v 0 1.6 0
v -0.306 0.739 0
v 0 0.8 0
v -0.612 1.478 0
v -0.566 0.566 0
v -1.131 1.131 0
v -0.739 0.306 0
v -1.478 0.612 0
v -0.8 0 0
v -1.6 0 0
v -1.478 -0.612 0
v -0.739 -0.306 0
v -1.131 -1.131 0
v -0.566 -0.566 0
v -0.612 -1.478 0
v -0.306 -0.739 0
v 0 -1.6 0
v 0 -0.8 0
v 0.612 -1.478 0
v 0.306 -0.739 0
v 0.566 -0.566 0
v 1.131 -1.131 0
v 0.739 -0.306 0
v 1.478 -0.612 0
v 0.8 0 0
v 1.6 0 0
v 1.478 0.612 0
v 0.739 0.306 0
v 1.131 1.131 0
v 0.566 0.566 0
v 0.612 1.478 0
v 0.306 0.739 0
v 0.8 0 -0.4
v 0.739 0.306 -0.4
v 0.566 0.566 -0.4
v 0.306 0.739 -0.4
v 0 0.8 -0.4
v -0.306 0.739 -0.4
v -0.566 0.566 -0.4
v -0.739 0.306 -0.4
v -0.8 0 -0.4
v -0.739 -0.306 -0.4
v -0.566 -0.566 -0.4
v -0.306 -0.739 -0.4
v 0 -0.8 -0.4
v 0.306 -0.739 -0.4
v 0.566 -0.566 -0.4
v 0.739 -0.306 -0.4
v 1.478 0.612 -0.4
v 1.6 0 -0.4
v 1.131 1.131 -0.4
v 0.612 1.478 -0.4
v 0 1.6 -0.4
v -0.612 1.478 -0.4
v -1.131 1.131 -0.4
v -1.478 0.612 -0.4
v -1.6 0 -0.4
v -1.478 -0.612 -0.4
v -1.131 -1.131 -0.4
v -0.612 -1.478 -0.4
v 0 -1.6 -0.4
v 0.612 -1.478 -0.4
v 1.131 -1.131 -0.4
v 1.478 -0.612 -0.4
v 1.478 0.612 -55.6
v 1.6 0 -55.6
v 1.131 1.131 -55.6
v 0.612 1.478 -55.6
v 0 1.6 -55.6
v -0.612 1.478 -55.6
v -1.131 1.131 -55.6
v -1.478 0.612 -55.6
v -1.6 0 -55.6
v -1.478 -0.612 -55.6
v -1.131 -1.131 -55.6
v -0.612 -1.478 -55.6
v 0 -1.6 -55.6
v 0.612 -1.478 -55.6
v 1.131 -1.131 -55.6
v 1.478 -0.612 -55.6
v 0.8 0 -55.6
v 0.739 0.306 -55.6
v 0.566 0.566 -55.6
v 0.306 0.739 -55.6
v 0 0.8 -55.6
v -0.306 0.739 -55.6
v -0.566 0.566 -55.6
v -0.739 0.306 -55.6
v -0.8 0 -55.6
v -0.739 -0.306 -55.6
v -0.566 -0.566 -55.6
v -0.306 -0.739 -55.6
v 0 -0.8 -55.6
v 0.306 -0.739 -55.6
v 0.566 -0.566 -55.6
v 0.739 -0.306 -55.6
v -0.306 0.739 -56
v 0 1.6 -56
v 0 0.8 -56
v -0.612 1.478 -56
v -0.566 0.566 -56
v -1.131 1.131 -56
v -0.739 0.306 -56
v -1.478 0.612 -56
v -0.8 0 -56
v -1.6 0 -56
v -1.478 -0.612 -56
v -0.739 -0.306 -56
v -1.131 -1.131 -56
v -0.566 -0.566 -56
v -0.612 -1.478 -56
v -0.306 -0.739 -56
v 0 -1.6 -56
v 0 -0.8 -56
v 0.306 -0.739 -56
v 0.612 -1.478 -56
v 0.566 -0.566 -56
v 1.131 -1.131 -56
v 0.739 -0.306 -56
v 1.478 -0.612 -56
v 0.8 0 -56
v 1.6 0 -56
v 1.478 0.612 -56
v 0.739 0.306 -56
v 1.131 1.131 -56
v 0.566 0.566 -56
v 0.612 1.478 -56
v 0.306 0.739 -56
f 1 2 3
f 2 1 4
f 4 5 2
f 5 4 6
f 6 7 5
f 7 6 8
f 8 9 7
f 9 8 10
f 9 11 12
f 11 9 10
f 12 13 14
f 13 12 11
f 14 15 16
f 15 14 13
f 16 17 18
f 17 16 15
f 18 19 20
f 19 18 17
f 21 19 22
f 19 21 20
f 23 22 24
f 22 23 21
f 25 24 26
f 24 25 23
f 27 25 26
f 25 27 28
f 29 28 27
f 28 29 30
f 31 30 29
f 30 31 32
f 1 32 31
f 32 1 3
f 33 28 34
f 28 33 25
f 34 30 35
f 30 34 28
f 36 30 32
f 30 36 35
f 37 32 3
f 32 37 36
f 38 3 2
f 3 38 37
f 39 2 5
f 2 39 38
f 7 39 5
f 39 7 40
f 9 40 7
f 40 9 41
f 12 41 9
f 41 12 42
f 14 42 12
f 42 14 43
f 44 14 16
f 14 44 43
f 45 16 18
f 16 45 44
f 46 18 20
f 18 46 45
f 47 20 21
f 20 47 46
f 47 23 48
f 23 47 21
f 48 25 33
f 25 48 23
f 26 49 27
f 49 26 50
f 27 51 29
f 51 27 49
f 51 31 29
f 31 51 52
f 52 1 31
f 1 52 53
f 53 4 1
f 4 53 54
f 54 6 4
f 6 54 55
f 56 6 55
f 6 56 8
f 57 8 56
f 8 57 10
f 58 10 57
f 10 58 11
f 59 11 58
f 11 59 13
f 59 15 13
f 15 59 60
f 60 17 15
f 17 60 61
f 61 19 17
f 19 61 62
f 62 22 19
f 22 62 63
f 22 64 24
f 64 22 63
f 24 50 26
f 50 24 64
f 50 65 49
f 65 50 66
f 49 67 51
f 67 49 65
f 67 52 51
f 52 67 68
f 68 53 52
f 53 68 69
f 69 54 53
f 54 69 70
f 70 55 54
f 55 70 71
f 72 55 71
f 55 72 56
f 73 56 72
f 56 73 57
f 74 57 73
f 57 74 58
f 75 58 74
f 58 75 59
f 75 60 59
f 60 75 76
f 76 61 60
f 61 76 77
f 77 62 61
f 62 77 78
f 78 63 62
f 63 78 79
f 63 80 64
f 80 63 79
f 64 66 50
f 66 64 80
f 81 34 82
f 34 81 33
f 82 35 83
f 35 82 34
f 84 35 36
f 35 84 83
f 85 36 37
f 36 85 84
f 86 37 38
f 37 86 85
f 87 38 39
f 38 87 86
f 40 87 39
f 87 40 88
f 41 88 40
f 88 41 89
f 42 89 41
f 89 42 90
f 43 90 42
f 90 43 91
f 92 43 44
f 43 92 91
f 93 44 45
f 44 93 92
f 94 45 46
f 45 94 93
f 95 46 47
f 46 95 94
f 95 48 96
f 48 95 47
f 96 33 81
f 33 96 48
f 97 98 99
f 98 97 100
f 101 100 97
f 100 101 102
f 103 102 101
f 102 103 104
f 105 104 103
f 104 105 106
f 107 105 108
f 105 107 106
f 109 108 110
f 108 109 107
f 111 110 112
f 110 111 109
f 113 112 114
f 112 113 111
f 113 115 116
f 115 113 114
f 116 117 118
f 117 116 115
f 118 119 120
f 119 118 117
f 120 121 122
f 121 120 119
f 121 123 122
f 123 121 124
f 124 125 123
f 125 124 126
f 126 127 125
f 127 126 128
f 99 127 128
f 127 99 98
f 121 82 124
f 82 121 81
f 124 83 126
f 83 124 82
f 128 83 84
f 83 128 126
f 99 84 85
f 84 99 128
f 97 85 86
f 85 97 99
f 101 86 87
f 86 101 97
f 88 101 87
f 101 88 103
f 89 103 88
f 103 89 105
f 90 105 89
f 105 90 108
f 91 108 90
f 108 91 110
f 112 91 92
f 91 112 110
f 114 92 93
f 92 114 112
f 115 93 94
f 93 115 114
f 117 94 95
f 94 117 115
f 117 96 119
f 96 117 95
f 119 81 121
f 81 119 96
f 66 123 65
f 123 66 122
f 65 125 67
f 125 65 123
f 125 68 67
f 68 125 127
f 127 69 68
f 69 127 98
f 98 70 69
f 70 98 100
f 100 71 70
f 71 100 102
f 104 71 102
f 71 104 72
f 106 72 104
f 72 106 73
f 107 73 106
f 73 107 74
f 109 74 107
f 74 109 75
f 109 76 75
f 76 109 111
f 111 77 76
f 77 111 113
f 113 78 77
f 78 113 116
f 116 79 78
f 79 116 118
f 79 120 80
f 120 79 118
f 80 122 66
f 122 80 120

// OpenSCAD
// file: ../p/4-4disc.scad
use <../lib.scad>
$fa=1; $fs=0.2;
function ldraw_lib__4_4disc(realsolid=false) = [
// 0 Disc 1.0
// 0 Name: 4-4disc.dat
// 0 Author: James Jessiman
// 0 !LDRAW_ORG Primitive UPDATE 2002-02
// 0 !LICENSE Licensed under CC BY 2.0 and CC BY 4.0 : see CAreadme.txt
// 
// 0 BFC CERTIFY CCW
  [0,"BFC","CERTIFY"],
  [0,"BFC","CCW"],
// 
// 0 !HISTORY 1998-12-15 [PTadmin] Official Update 1998-10
// 0 !HISTORY 2002-03-23 [sbliss] Added BFC statement
// 0 !HISTORY 2002-04-25 [PTadmin] Official Update 2002-02
// 0 !HISTORY 2007-06-24 [PTadmin] Header formatted for Contributor Agreement
// 0 !HISTORY 2008-07-01 [PTadmin] Official Update 2008-01
// 
// 
// 3 16 0 0 0 1 0 0 0.9239 0 0.3827
  [3,16,0,0,0,1,0,0,0.9239,0,0.3827],
// 3 16 0 0 0 0.9239 0 0.3827 0.7071 0 0.7071
  [3,16,0,0,0,0.9239,0,0.3827,0.7071,0,0.7071],
// 3 16 0 0 0 0.7071 0 0.7071 0.3827 0 0.9239
  [3,16,0,0,0,0.7071,0,0.7071,0.3827,0,0.9239],
// 3 16 0 0 0 0.3827 0 0.9239 0 0 1
  [3,16,0,0,0,0.3827,0,0.9239,0,0,1],
// 3 16 0 0 0 0 0 1 -0.3827 0 0.9239
  [3,16,0,0,0,0,0,1,-0.3827,0,0.9239],
// 3 16 0 0 0 -0.3827 0 0.9239 -0.7071 0 0.7071
  [3,16,0,0,0,-0.3827,0,0.9239,-0.7071,0,0.7071],
// 3 16 0 0 0 -0.7071 0 0.7071 -0.9239 0 0.3827
  [3,16,0,0,0,-0.7071,0,0.7071,-0.9239,0,0.3827],
// 3 16 0 0 0 -0.9239 0 0.3827 -1 0 -0
  [3,16,0,0,0,-0.9239,0,0.3827,-1,0,-0],
// 3 16 0 0 0 -1 0 -0 -0.9239 0 -0.3827
  [3,16,0,0,0,-1,0,-0,-0.9239,0,-0.3827],
// 3 16 0 0 0 -0.9239 0 -0.3827 -0.7071 0 -0.7071
  [3,16,0,0,0,-0.9239,0,-0.3827,-0.7071,0,-0.7071],
// 3 16 0 0 0 -0.7071 0 -0.7071 -0.3827 0 -0.9239
  [3,16,0,0,0,-0.7071,0,-0.7071,-0.3827,0,-0.9239],
// 3 16 0 0 0 -0.3827 0 -0.9239 0 0 -1
  [3,16,0,0,0,-0.3827,0,-0.9239,0,0,-1],
// 3 16 0 0 0 0 0 -1 0.3827 0 -0.9239
  [3,16,0,0,0,0,0,-1,0.3827,0,-0.9239],
// 3 16 0 0 0 0.3827 0 -0.9239 0.7071 0 -0.7071
  [3,16,0,0,0,0.3827,0,-0.9239,0.7071,0,-0.7071],
// 3 16 0 0 0 0.7071 0 -0.7071 0.9239 0 -0.3827
  [3,16,0,0,0,0.7071,0,-0.7071,0.9239,0,-0.3827],
// 3 16 0 0 0 0.9239 0 -0.3827 1 0 0
  [3,16,0,0,0,0.9239,0,-0.3827,1,0,0],
// 0
];
module ldraw_lib__4_4disc(step=0, col=false, unit=2/5, alt=false, line=0.2, solid=!$preview)
    makepoly(ldraw_lib__4_4disc(solid), step=step, col=col, unit=unit, alt=alt, line=line, solid=solid);
ldraw_lib__4_4disc(line=0.2);
// file: ../p/stud3.scad
use <../lib.scad>
use <4-4cyli.scad>
use <4-4disc.scad>
use <4-4edge.scad>
$fa=1; $fs=0.2;
function ldraw_lib__stud3(realsolid=false) = realsolid ? 
    [openscad(translate([0,0,-eps()], o=cylinder(4+eps(), r=4)),2)] : [
// 0 Stud Tube Solid
// 0 Name: stud3.dat
// 0 Author: James Jessiman
// 0 !LDRAW_ORG Primitive UPDATE 2012-01
// 0 !LICENSE Licensed under CC BY 2.0 and CC BY 4.0 : see CAreadme.txt
// 
// 0 BFC CERTIFY CCW
  [0,"BFC","CERTIFY"],
  [0,"BFC","CCW"],
// 
// 0 !HISTORY 2002-04-04 [sbliss] Modified for BFC compliance
// 0 !HISTORY 2002-04-25 [PTadmin] Official Update 2002-02
// 0 !HISTORY 2007-06-24 [PTadmin] Header formatted for Contributor Agreement
// 0 !HISTORY 2008-07-01 [PTadmin] Official Update 2008-01
// 0 !HISTORY 2012-02-16 [Philo] Changed to CCW
// 0 !HISTORY 2012-03-30 [PTadmin] Official Update 2012-01
// 
// 
// 1 16 0 -4 0 4 0 0 0 1 0 0 0 4 4-4edge.dat
  [1,16,0,-4,0,4,0,0,0,1,0,0,0,4, ldraw_lib__4_4edge(realsolid)],
// 1 16 0 0 0 4 0 0 0 1 0 0 0 4 4-4edge.dat
  [1,16,0,0,0,4,0,0,0,1,0,0,0,4, ldraw_lib__4_4edge(realsolid)],
// 1 16 0 -4 0 4 0 0 0 1 0 0 0 4 4-4disc.dat
  [1,16,0,-4,0,4,0,0,0,1,0,0,0,4, ldraw_lib__4_4disc(realsolid)],
// 1 16 0 -4 0 4 0 0 0 4 0 0 0 4 4-4cyli.dat
  [1,16,0,-4,0,4,0,0,0,4,0,0,0,4, ldraw_lib__4_4cyli(realsolid)],
];
module ldraw_lib__stud3(step=0, col=false, unit=2/5, alt=false, line=0.2, solid=!$preview)
    makepoly(ldraw_lib__stud3(solid), step=step, col=col, unit=unit, alt=alt, line=line, solid=solid);
ldraw_lib__stud3(line=0.2);
// file: ../p/stud.scad
use <../lib.scad>
use <4-4cyli.scad>
use <4-4disc.scad>
use <4-4edge.scad>
$fa=1; $fs=0.2;
function ldraw_lib__stud(realsolid=false) = realsolid ? 
    [openscad(translate([0,0,-eps()], o=cylinder(4+eps(), r=6)),2)] : [
// 0 Stud
// 0 Name: stud.dat
// 0 Author: James Jessiman
// 0 !LDRAW_ORG Primitive UPDATE 2012-01
// 0 !LICENSE Licensed under CC BY 2.0 and CC BY 4.0 : see CAreadme.txt
// 
// 0 BFC CERTIFY CCW
  [0,"BFC","CERTIFY"],
  [0,"BFC","CCW"],
// 
// 0 !HISTORY 2002-04-04 [sbliss] Modified for BFC compliance
// 0 !HISTORY 2002-04-25 [PTadmin] Official Update 2002-02
// 0 !HISTORY 2007-06-24 [PTadmin] Header formatted for Contributor Agreement
// 0 !HISTORY 2008-07-01 [PTadmin] Official Update 2008-01
// 0 !HISTORY 2012-02-16 [Philo] Changed to CCW
// 0 !HISTORY 2012-03-30 [PTadmin] Official Update 2012-01
// 
// 
// 1 16 0 0 0 6 0 0 0 1 0 0 0 6 4-4edge.dat
  [1,16,0,0,0,6,0,0,0,1,0,0,0,6, ldraw_lib__4_4edge(realsolid)],
// 1 16 0 -4 0 6 0 0 0 1 0 0 0 6 4-4edge.dat
  [1,16,0,-4,0,6,0,0,0,1,0,0,0,6, ldraw_lib__4_4edge(realsolid)],
// 1 16 0 0 0 6 0 0 0 -4 0 0 0 6 4-4cyli.dat
  [1,16,0,0,0,6,0,0,0,-4,0,0,0,6, ldraw_lib__4_4cyli(realsolid)],
// 1 16 0 -4 0 6 0 0 0 1 0 0 0 6 4-4disc.dat
  [1,16,0,-4,0,6,0,0,0,1,0,0,0,6, ldraw_lib__4_4disc(realsolid)],
];
module ldraw_lib__stud(step=0, col=false, unit=2/5, alt=false, line=0.2, solid=!$preview)
    makepoly(ldraw_lib__stud(solid), step=step, col=col, unit=unit, alt=alt, line=line, solid=solid);
ldraw_lib__stud(line=0.2);
// file: ../p/box5.scad
use <../lib.scad>
$fa=1; $fs=0.2;
function ldraw_lib__box5(realsolid=false) = [
// 0 Box with 5 Faces and All Edges
// 0 Name: box5.dat
// 0 Author: James Jessiman
// 0 !LDRAW_ORG Primitive UPDATE 2012-01
// 0 !LICENSE Licensed under CC BY 2.0 and CC BY 4.0 : see CAreadme.txt
// 
// 0 BFC CERTIFY CCW
  [0,"BFC","CERTIFY"],
  [0,"BFC","CCW"],
// 
// 0 !HISTORY 2002-04-03 [sbliss] Modified for BFC compliance
// 0 !HISTORY 2002-04-25 [PTadmin] Official Update 2002-02
// 0 !HISTORY 2007-06-24 [PTadmin] Header formatted for Contributor Agreement
// 0 !HISTORY 2008-07-01 [PTadmin] Official Update 2008-01
// 0 !HISTORY 2012-02-16 [Philo] Changed to CCW
// 0 !HISTORY 2012-03-30 [PTadmin] Official Update 2012-01
// 
// 
// 2 24 1 1 1 -1 1 1
  [2,24,1,1,1,-1,1,1],
// 2 24 -1 1 1 -1 1 -1
  [2,24,-1,1,1,-1,1,-1],
// 2 24 -1 1 -1 1 1 -1
  [2,24,-1,1,-1,1,1,-1],
// 2 24 1 1 -1 1 1 1
  [2,24,1,1,-1,1,1,1],
// 2 24 1 0 1 -1 0 1
  [2,24,1,0,1,-1,0,1],
// 2 24 -1 0 1 -1 0 -1
  [2,24,-1,0,1,-1,0,-1],
// 2 24 -1 0 -1 1 0 -1
  [2,24,-1,0,-1,1,0,-1],
// 2 24 1 0 -1 1 0 1
  [2,24,1,0,-1,1,0,1],
// 2 24 1 0 1 1 1 1
  [2,24,1,0,1,1,1,1],
// 2 24 -1 0 1 -1 1 1
  [2,24,-1,0,1,-1,1,1],
// 2 24 1 0 -1 1 1 -1
  [2,24,1,0,-1,1,1,-1],
// 2 24 -1 0 -1 -1 1 -1
  [2,24,-1,0,-1,-1,1,-1],
// 4 16 -1 1 1 1 1 1 1 1 -1 -1 1 -1
  [4,16,-1,1,1,1,1,1,1,1,-1,-1,1,-1],
// 4 16 -1 1 1 -1 0 1 1 0 1 1 1 1
  [4,16,-1,1,1,-1,0,1,1,0,1,1,1,1],
// 4 16 -1 1 -1 -1 0 -1 -1 0 1 -1 1 1
  [4,16,-1,1,-1,-1,0,-1,-1,0,1,-1,1,1],
// 4 16 1 1 -1 1 0 -1 -1 0 -1 -1 1 -1
  [4,16,1,1,-1,1,0,-1,-1,0,-1,-1,1,-1],
// 4 16 1 1 1 1 0 1 1 0 -1 1 1 -1
  [4,16,1,1,1,1,0,1,1,0,-1,1,1,-1],
];
module ldraw_lib__box5(step=0, col=false, unit=2/5, alt=false, line=0.2, solid=!$preview)
    makepoly(ldraw_lib__box5(solid), step=step, col=col, unit=unit, alt=alt, line=line, solid=solid);
ldraw_lib__box5(line=0.2);
// file: ../p/box4t.scad
use <../lib.scad>
$fa=1; $fs=0.2;
function ldraw_lib__box4t(realsolid=false) = [
// 0 Box with 4 Adjacent Faces and All Edges
// 0 Name: box4t.dat
// 0 Author: Tore Eriksson [Tore_Eriksson]
// 0 !LDRAW_ORG Primitive UPDATE 2003-02
// 0 !LICENSE Licensed under CC BY 2.0 and CC BY 4.0 : see CAreadme.txt
// 
// 0 BFC CERTIFY CCW
  [0,"BFC","CERTIFY"],
  [0,"BFC","CCW"],
// 
// 0 !HISTORY 1997-09-29 [PTadmin] Official Update 1997-15
// 0 !HISTORY 2002-08-31 [izanette] Modified with WINDZ for BFC compliance
// 0 !HISTORY 2003-08-01 [PTadmin] Official Update 2003-02
// 0 !HISTORY 2007-06-24 [PTadmin] Header formatted for Contributor Agreement
// 0 !HISTORY 2008-07-01 [PTadmin] Official Update 2008-01
// 
// 
// 2 24 1 1 1 -1 1 1
  [2,24,1,1,1,-1,1,1],
// 2 24 -1 1 1 -1 1 -1
  [2,24,-1,1,1,-1,1,-1],
// 2 24 -1 1 -1 1 1 -1
  [2,24,-1,1,-1,1,1,-1],
// 2 24 1 1 -1 1 1 1
  [2,24,1,1,-1,1,1,1],
// 2 24 1 0 1 -1 0 1
  [2,24,1,0,1,-1,0,1],
// 2 24 -1 0 1 -1 0 -1
  [2,24,-1,0,1,-1,0,-1],
// 2 24 -1 0 -1 1 0 -1
  [2,24,-1,0,-1,1,0,-1],
// 2 24 1 0 -1 1 0 1
  [2,24,1,0,-1,1,0,1],
// 2 24 1 0 1 1 1 1
  [2,24,1,0,1,1,1,1],
// 2 24 -1 0 1 -1 1 1
  [2,24,-1,0,1,-1,1,1],
// 2 24 1 0 -1 1 1 -1
  [2,24,1,0,-1,1,1,-1],
// 2 24 -1 0 -1 -1 1 -1
  [2,24,-1,0,-1,-1,1,-1],
// 4 16 1 1 1 1 1 -1 -1 1 -1 -1 1 1
  [4,16,1,1,1,1,1,-1,-1,1,-1,-1,1,1],
// 4 16 1 1 1 -1 1 1 -1 0 1 1 0 1
  [4,16,1,1,1,-1,1,1,-1,0,1,1,0,1],
// 4 16 -1 1 1 -1 1 -1 -1 0 -1 -1 0 1
  [4,16,-1,1,1,-1,1,-1,-1,0,-1,-1,0,1],
// 0 4 16 -1 1 -1 -1 0 -1 1 0 -1 1 1 -1
// 4 16 1 1 -1 1 1 1 1 0 1 1 0 -1
  [4,16,1,1,-1,1,1,1,1,0,1,1,0,-1],
// 0
];
module ldraw_lib__box4t(step=0, col=false, unit=2/5, alt=false, line=0.2, solid=!$preview)
    makepoly(ldraw_lib__box4t(solid), step=step, col=col, unit=unit, alt=alt, line=line, solid=solid);
ldraw_lib__box4t(line=0.2);
// file: s/3004s01.scad
use <../../lib.scad>
use <../../p/box4t.scad>
use <../../p/box5.scad>
use <../../p/stud.scad>
use <../../p/stud3.scad>
$fa=1; $fs=0.2;
function ldraw_lib__s__3004s01(realsolid=false) = [
// 0 ~Brick  1 x  2 without Front Face
// 0 Name: s\3004s01.dat
// 0 Author: James Jessiman
// 0 !LDRAW_ORG Subpart UPDATE 2003-03
// 0 !LICENSE Licensed under CC BY 2.0 and CC BY 4.0 : see CAreadme.txt
// 
// 0 BFC CERTIFY CCW
  [0,"BFC","CERTIFY"],
  [0,"BFC","CCW"],
// 
// 0 !HISTORY 2003-09-07 [jriley] Subfiling, BFC
// 0 !HISTORY 2003-12-19 [PTadmin] Official Update 2003-03
// 0 !HISTORY 2007-08-29 [PTadmin] Header formatted for Contributor Agreement
// 0 !HISTORY 2008-07-01 [PTadmin] Official Update 2008-01
// 
// 
// 1 16 0 4 0 1 0 0 0 -5 0 0 0 1 stud3.dat
  [1,16,0,4,0,1,0,0,0,-5,0,0,0,1, ldraw_lib__stud3(realsolid)],
// 0 BFC INVERTNEXT
  [0,"BFC","INVERTNEXT"],
// 1 16 0 24 0 16 0 0 0 -20 0 0 0 6 box5.dat
  [1,16,0,24,0,16,0,0,0,-20,0,0,0,6, ldraw_lib__box5(realsolid)],
// 4 16 20 24 10 16 24 6 -16 24 6 -20 24 10
  [4,16,20,24,10,16,24,6,-16,24,6,-20,24,10],
// 4 16 -20 24 10 -16 24 6 -16 24 -6 -20 24 -10
  [4,16,-20,24,10,-16,24,6,-16,24,-6,-20,24,-10],
// 4 16 -20 24 -10 -16 24 -6 16 24 -6 20 24 -10
  [4,16,-20,24,-10,-16,24,-6,16,24,-6,20,24,-10],
// 4 16 20 24 -10 16 24 -6 16 24 6 20 24 10
  [4,16,20,24,-10,16,24,-6,16,24,6,20,24,10],
// 1 16 0 24 0 20 0 0 0 -24 0 0 0 10 box4t.dat
  [1,16,0,24,0,20,0,0,0,-24,0,0,0,10, ldraw_lib__box4t(realsolid)],
// 1 16 10 0 0 1 0 0 0 1 0 0 0 1 stud.dat
  [1,16,10,0,0,1,0,0,0,1,0,0,0,1, ldraw_lib__stud(realsolid)],
// 1 16 -10 0 0 1 0 0 0 1 0 0 0 1 stud.dat
  [1,16,-10,0,0,1,0,0,0,1,0,0,0,1, ldraw_lib__stud(realsolid)],
// 0
];
module ldraw_lib__s__3004s01(step=0, col=false, unit=2/5, alt=false, line=0.2, solid=!$preview)
    makepoly(ldraw_lib__s__3004s01(solid), step=step, col=col, unit=unit, alt=alt, line=line, solid=solid);
ldraw_lib__s__3004s01(line=0.2);
// file: ../p/4-4ring1.scad
use <../lib.scad>
$fa=1; $fs=0.2;
function ldraw_lib__4_4ring1(realsolid=false) = [
// 0 Ring  1 x 1.0
// 0 Name: 4-4ring1.dat
// 0 Author: James Jessiman
// 0 !LDRAW_ORG Primitive UPDATE 2009-01
// 0 !LICENSE Licensed under CC BY 2.0 and CC BY 4.0 : see CAreadme.txt
// 
// 0 BFC CERTIFY CCW
  [0,"BFC","CERTIFY"],
  [0,"BFC","CCW"],
// 
// 0 !HISTORY 1998-12-15 [PTadmin] Official Update 1998-10
// 0 !HISTORY 2002-04-08 [BrickCaster] Modified for BFC compliance
// 0 !HISTORY 2002-04-25 [PTadmin] Official Update 2002-02
// 0 !HISTORY 2007-06-24 [PTadmin] Header formatted for Contributor Agreement
// 0 !HISTORY 2008-07-01 [PTadmin] Official Update 2008-01
// 0 !HISTORY 2008-08-26 [cwdee] Switch polygon winding and rename
// 0 !HISTORY 2009-05-02 [PTadmin] Official Update 2009-01
// 
// 
// 4 16 -0.7654 0 1.8478 -0.3827 0 0.9239 0 0 1 0 0 2
  [4,16,-0.7654,0,1.8478,-0.3827,0,0.9239,0,0,1,0,0,2],
// 4 16 -1.4142 0 1.4142 -0.7071 0 0.7071 -0.3827 0 0.9239 -0.7654 0 1.8478
  [4,16,-1.4142,0,1.4142,-0.7071,0,0.7071,-0.3827,0,0.9239,-0.7654,0,1.8478],
// 4 16 -1.8478 0 0.7654 -0.9239 0 0.3827 -0.7071 0 0.7071 -1.4142 0 1.41420
  [4,16,-1.8478,0,0.7654,-0.9239,0,0.3827,-0.7071,0,0.7071,-1.4142,0,1.41420],
// 4 16 -2 0 0 -1 0 0 -0.9239 0 0.3827 -1.8478 0 0.7654
  [4,16,-2,0,0,-1,0,0,-0.9239,0,0.3827,-1.8478,0,0.7654],
// 4 16 -1.8478 0 -0.7654 -0.9239 0 -0.3827 -1 0 0 -2 0 0
  [4,16,-1.8478,0,-0.7654,-0.9239,0,-0.3827,-1,0,0,-2,0,0],
// 4 16 -1.4142 0 -1.4142 -0.7071 0 -0.7071 -0.9239 0 -0.3827 -1.8478 0 -0.7654
  [4,16,-1.4142,0,-1.4142,-0.7071,0,-0.7071,-0.9239,0,-0.3827,-1.8478,0,-0.7654],
// 4 16 -0.7654 0 -1.8478 -0.3827 0 -0.9239 -0.7071 0 -0.7071 -1.4142 0 -1.4142
  [4,16,-0.7654,0,-1.8478,-0.3827,0,-0.9239,-0.7071,0,-0.7071,-1.4142,0,-1.4142],
// 4 16 0 0 -2 0 0 -1 -0.3827 0 -0.9239 -0.7654 0 -1.8478
  [4,16,0,0,-2,0,0,-1,-0.3827,0,-0.9239,-0.7654,0,-1.8478],
// 4 16 0.7654 0 -1.8478 0.3827 0 -0.9239 0 0 -1 0 0 -2
  [4,16,0.7654,0,-1.8478,0.3827,0,-0.9239,0,0,-1,0,0,-2],
// 4 16 1.4142 0 -1.4142 0.7071 0 -0.7071 0.3827 0 -0.9239 0.7654 0 -1.8478
  [4,16,1.4142,0,-1.4142,0.7071,0,-0.7071,0.3827,0,-0.9239,0.7654,0,-1.8478],
// 4 16 1.8478 0 -0.7654 0.9239 0 -0.3827 0.7071 0 -0.7071 1.4142 0 -1.4142
  [4,16,1.8478,0,-0.7654,0.9239,0,-0.3827,0.7071,0,-0.7071,1.4142,0,-1.4142],
// 4 16 2 0 0 1 0 0 0.9239 0 -0.3827 1.8478 0 -0.7654
  [4,16,2,0,0,1,0,0,0.9239,0,-0.3827,1.8478,0,-0.7654],
// 4 16 1.8478 0 0.7654 0.9239 0 0.3827 1 0 0 2 0 0
  [4,16,1.8478,0,0.7654,0.9239,0,0.3827,1,0,0,2,0,0],
// 4 16 1.4142 0 1.4142 0.7071 0 0.7071 0.9239 0 0.3827 1.8478 0 0.7654
  [4,16,1.4142,0,1.4142,0.7071,0,0.7071,0.9239,0,0.3827,1.8478,0,0.7654],
// 4 16 0.7654 0 1.8478 0.3827 0 0.9239 0.7071 0 0.7071 1.4142 0 1.4142
  [4,16,0.7654,0,1.8478,0.3827,0,0.9239,0.7071,0,0.7071,1.4142,0,1.4142],
// 4 16 0 0 2 0 0 1 0.3827 0 0.9239 0.7654 0 1.8478
  [4,16,0,0,2,0,0,1,0.3827,0,0.9239,0.7654,0,1.8478],
// 0
];
module ldraw_lib__4_4ring1(step=0, col=false, unit=2/5, alt=false, line=0.2, solid=!$preview)
    makepoly(ldraw_lib__4_4ring1(solid), step=step, col=col, unit=unit, alt=alt, line=line, solid=solid);
ldraw_lib__4_4ring1(line=0.2);
// file: ../p/4-4edge.scad
use <../lib.scad>
$fa=1; $fs=0.2;
function ldraw_lib__4_4edge(realsolid=false) = [
// 0 Circle 1.0
// 0 Name: 4-4edge.dat
// 0 Author: James Jessiman
// 0 !LDRAW_ORG Primitive UPDATE 2017-01
// 0 !LICENSE Licensed under CC BY 2.0 and CC BY 4.0 : see CAreadme.txt
// 
// 0 BFC CERTIFY CCW
  [0,"BFC","CERTIFY"],
  [0,"BFC","CCW"],
// 
// 0 !HISTORY 1998-12-15 [PTadmin] Official Update 1998-10
// 0 !HISTORY 2005-12-28 [PTadmin] Official Update 2005-01
// 0 !HISTORY 2007-06-24 [PTadmin] Header formatted for Contributor Agreement
// 0 !HISTORY 2008-07-01 [PTadmin] Official Update 2008-01
// 0 !HISTORY 2017-01-15 [Steffen] BFCed
// 0 !HISTORY 2017-12-30 [PTadmin] Official Update 2017-01
// 
// 
// 2 24 1 0 0 0.9239 0 0.3827
  [2,24,1,0,0,0.9239,0,0.3827],
// 2 24 0.9239 0 0.3827 0.7071 0 0.7071
  [2,24,0.9239,0,0.3827,0.7071,0,0.7071],
// 2 24 0.7071 0 0.7071 0.3827 0 0.9239
  [2,24,0.7071,0,0.7071,0.3827,0,0.9239],
// 2 24 0.3827 0 0.9239 0 0 1
  [2,24,0.3827,0,0.9239,0,0,1],
// 2 24 0 0 1 -0.3827 0 0.9239
  [2,24,0,0,1,-0.3827,0,0.9239],
// 2 24 -0.3827 0 0.9239 -0.7071 0 0.7071
  [2,24,-0.3827,0,0.9239,-0.7071,0,0.7071],
// 2 24 -0.7071 0 0.7071 -0.9239 0 0.3827
  [2,24,-0.7071,0,0.7071,-0.9239,0,0.3827],
// 2 24 -0.9239 0 0.3827 -1 0 -0
  [2,24,-0.9239,0,0.3827,-1,0,-0],
// 2 24 -1 0 -0 -0.9239 0 -0.3827
  [2,24,-1,0,-0,-0.9239,0,-0.3827],
// 2 24 -0.9239 0 -0.3827 -0.7071 0 -0.7071
  [2,24,-0.9239,0,-0.3827,-0.7071,0,-0.7071],
// 2 24 -0.7071 0 -0.7071 -0.3827 0 -0.9239
  [2,24,-0.7071,0,-0.7071,-0.3827,0,-0.9239],
// 2 24 -0.3827 0 -0.9239 0 0 -1
  [2,24,-0.3827,0,-0.9239,0,0,-1],
// 2 24 0 0 -1 0.3827 0 -0.9239
  [2,24,0,0,-1,0.3827,0,-0.9239],
// 2 24 0.3827 0 -0.9239 0.7071 0 -0.7071
  [2,24,0.3827,0,-0.9239,0.7071,0,-0.7071],
// 2 24 0.7071 0 -0.7071 0.9239 0 -0.3827
  [2,24,0.7071,0,-0.7071,0.9239,0,-0.3827],
// 2 24 0.9239 0 -0.3827 1 0 0
  [2,24,0.9239,0,-0.3827,1,0,0],
];
module ldraw_lib__4_4edge(step=0, col=false, unit=2/5, alt=false, line=0.2, solid=!$preview)
    makepoly(ldraw_lib__4_4edge(solid), step=step, col=col, unit=unit, alt=alt, line=line, solid=solid);
ldraw_lib__4_4edge(line=0.2);
// file: ../p/4-4cyli.scad
use <../lib.scad>
$fa=1; $fs=0.2;
function ldraw_lib__4_4cyli(realsolid=false) = [
// 0 Cylinder 1.0
// 0 Name: 4-4cyli.dat
// 0 Author: James Jessiman
// 0 !LDRAW_ORG Primitive UPDATE 2005-01
// 0 !LICENSE Licensed under CC BY 2.0 and CC BY 4.0 : see CAreadme.txt
// 
// 0 BFC CERTIFY CCW
  [0,"BFC","CERTIFY"],
  [0,"BFC","CCW"],
// 
// 0 !HISTORY 1998-12-15 [PTadmin] Official Update 1998-10
// 0 !HISTORY 2002-03-23 [sbliss] Added BFC statement; merged headers from files in distributions LDraw 0.27 and Complete.
// 0 !HISTORY 2002-04-25 [PTadmin] Official Update 2002-02
// 0 !HISTORY 2004-12-14 [guyvivan] BFC CCW
// 0 !HISTORY 2005-12-28 [PTadmin] Official Update 2005-01
// 0 !HISTORY 2007-06-24 [PTadmin] Header formatted for Contributor Agreement
// 0 !HISTORY 2008-07-01 [PTadmin] Official Update 2008-01
// 
// 
// 4 16 1 1 0 0.9239 1 0.3827 0.9239 0 0.3827 1 0 0
  [4,16,1,1,0,0.9239,1,0.3827,0.9239,0,0.3827,1,0,0],
// 5 24 1 0 0 1 1 0 0.9239 0 0.3827 0.9239 0 -0.3827
  [5,24,1,0,0,1,1,0,0.9239,0,0.3827,0.9239,0,-0.3827],
// 4 16 0.9239 1 0.3827 0.7071 1 0.7071 0.7071 0 0.7071 0.9239 0 0.3827
  [4,16,0.9239,1,0.3827,0.7071,1,0.7071,0.7071,0,0.7071,0.9239,0,0.3827],
// 5 24 0.9239 0 0.3827 0.9239 1 0.3827 0.7071 0 0.7071 1 0 0
  [5,24,0.9239,0,0.3827,0.9239,1,0.3827,0.7071,0,0.7071,1,0,0],
// 4 16 0.7071 1 0.7071 0.3827 1 0.9239 0.3827 0 0.9239 0.7071 0 0.7071
  [4,16,0.7071,1,0.7071,0.3827,1,0.9239,0.3827,0,0.9239,0.7071,0,0.7071],
// 5 24 0.7071 0 0.7071 0.7071 1 0.7071 0.3827 0 0.9239 0.9239 0 0.3827
  [5,24,0.7071,0,0.7071,0.7071,1,0.7071,0.3827,0,0.9239,0.9239,0,0.3827],
// 4 16 0.3827 1 0.9239 0 1 1 0 0 1 0.3827 0 0.9239
  [4,16,0.3827,1,0.9239,0,1,1,0,0,1,0.3827,0,0.9239],
// 5 24 0.3827 0 0.9239 0.3827 1 0.9239 0 0 1 0.7071 0 0.7071
  [5,24,0.3827,0,0.9239,0.3827,1,0.9239,0,0,1,0.7071,0,0.7071],
// 4 16 0 1 1 -0.3827 1 0.9239 -0.3827 0 0.9239 0 0 1
  [4,16,0,1,1,-0.3827,1,0.9239,-0.3827,0,0.9239,0,0,1],
// 5 24 0 0 1 0 1 1 -0.3827 0 0.9239 0.3827 0 0.9239
  [5,24,0,0,1,0,1,1,-0.3827,0,0.9239,0.3827,0,0.9239],
// 4 16 -0.3827 1 0.9239 -0.7071 1 0.7071 -0.7071 0 0.7071 -0.3827 0 0.9239
  [4,16,-0.3827,1,0.9239,-0.7071,1,0.7071,-0.7071,0,0.7071,-0.3827,0,0.9239],
// 5 24 -0.3827 0 0.9239 -0.3827 1 0.9239 -0.7071 0 0.7071 0 0 1
  [5,24,-0.3827,0,0.9239,-0.3827,1,0.9239,-0.7071,0,0.7071,0,0,1],
// 4 16 -0.7071 1 0.7071 -0.9239 1 0.3827 -0.9239 0 0.3827 -0.7071 0 0.7071
  [4,16,-0.7071,1,0.7071,-0.9239,1,0.3827,-0.9239,0,0.3827,-0.7071,0,0.7071],
// 5 24 -0.7071 0 0.7071 -0.7071 1 0.7071 -0.9239 0 0.3827 -0.3827 0 0.9239
  [5,24,-0.7071,0,0.7071,-0.7071,1,0.7071,-0.9239,0,0.3827,-0.3827,0,0.9239],
// 4 16 -0.9239 1 0.3827 -1 1 0 -1 0 0 -0.9239 0 0.3827
  [4,16,-0.9239,1,0.3827,-1,1,0,-1,0,0,-0.9239,0,0.3827],
// 5 24 -0.9239 0 0.3827 -0.9239 1 0.3827 -1 0 0 -0.7071 0 0.7071
  [5,24,-0.9239,0,0.3827,-0.9239,1,0.3827,-1,0,0,-0.7071,0,0.7071],
// 4 16 -1 1 0 -0.9239 1 -0.3827 -0.9239 0 -0.3827 -1 0 0
  [4,16,-1,1,0,-0.9239,1,-0.3827,-0.9239,0,-0.3827,-1,0,0],
// 5 24 -1 0 0 -1 1 0 -0.9239 0 -0.3827 -0.9239 0 0.3827
  [5,24,-1,0,0,-1,1,0,-0.9239,0,-0.3827,-0.9239,0,0.3827],
// 4 16 -0.9239 1 -0.3827 -0.7071 1 -0.7071 -0.7071 0 -0.7071 -0.9239 0 -0.3827
  [4,16,-0.9239,1,-0.3827,-0.7071,1,-0.7071,-0.7071,0,-0.7071,-0.9239,0,-0.3827],
// 5 24 -0.9239 0 -0.3827 -0.9239 1 -0.3827 -0.7071 0 -0.7071 -1 0 0
  [5,24,-0.9239,0,-0.3827,-0.9239,1,-0.3827,-0.7071,0,-0.7071,-1,0,0],
// 4 16 -0.7071 1 -0.7071 -0.3827 1 -0.9239 -0.3827 0 -0.9239 -0.7071 0 -0.7071
  [4,16,-0.7071,1,-0.7071,-0.3827,1,-0.9239,-0.3827,0,-0.9239,-0.7071,0,-0.7071],
// 5 24 -0.7071 0 -0.7071 -0.7071 1 -0.7071 -0.3827 0 -0.9239 -0.9239 0 -0.3827
  [5,24,-0.7071,0,-0.7071,-0.7071,1,-0.7071,-0.3827,0,-0.9239,-0.9239,0,-0.3827],
// 4 16 -0.3827 1 -0.9239 0 1 -1 0 0 -1 -0.3827 0 -0.9239
  [4,16,-0.3827,1,-0.9239,0,1,-1,0,0,-1,-0.3827,0,-0.9239],
// 5 24 -0.3827 0 -0.9239 -0.3827 1 -0.9239 0 0 -1 -0.7071 0 -0.7071
  [5,24,-0.3827,0,-0.9239,-0.3827,1,-0.9239,0,0,-1,-0.7071,0,-0.7071],
// 4 16 0 1 -1 0.3827 1 -0.9239 0.3827 0 -0.9239 0 0 -1
  [4,16,0,1,-1,0.3827,1,-0.9239,0.3827,0,-0.9239,0,0,-1],
// 5 24 0 0 -1 0 1 -1 0.3827 0 -0.9239 -0.3827 0 -0.9239
  [5,24,0,0,-1,0,1,-1,0.3827,0,-0.9239,-0.3827,0,-0.9239],
// 4 16 0.3827 1 -0.9239 0.7071 1 -0.7071 0.7071 0 -0.7071 0.3827 0 -0.9239
  [4,16,0.3827,1,-0.9239,0.7071,1,-0.7071,0.7071,0,-0.7071,0.3827,0,-0.9239],
// 5 24 0.3827 0 -0.9239 0.3827 1 -0.9239 0.7071 0 -0.7071 0 0 -1
  [5,24,0.3827,0,-0.9239,0.3827,1,-0.9239,0.7071,0,-0.7071,0,0,-1],
// 4 16 0.7071 1 -0.7071 0.9239 1 -0.3827 0.9239 0 -0.3827 0.7071 0 -0.7071
  [4,16,0.7071,1,-0.7071,0.9239,1,-0.3827,0.9239,0,-0.3827,0.7071,0,-0.7071],
// 5 24 0.7071 0 -0.7071 0.7071 1 -0.7071 0.9239 0 -0.3827 0.3827 0 -0.9239
  [5,24,0.7071,0,-0.7071,0.7071,1,-0.7071,0.9239,0,-0.3827,0.3827,0,-0.9239],
// 4 16 0.9239 1 -0.3827 1 1 0 1 0 0 0.9239 0 -0.3827
  [4,16,0.9239,1,-0.3827,1,1,0,1,0,0,0.9239,0,-0.3827],
// 5 24 0.9239 0 -0.3827 0.9239 1 -0.3827 1 0 0 0.7071 0 -0.7071
  [5,24,0.9239,0,-0.3827,0.9239,1,-0.3827,1,0,0,0.7071,0,-0.7071],
// 0
];
module ldraw_lib__4_4cyli(step=0, col=false, unit=2/5, alt=false, line=0.2, solid=!$preview)
    makepoly(ldraw_lib__4_4cyli(solid), step=step, col=col, unit=unit, alt=alt, line=line, solid=solid);
ldraw_lib__4_4cyli(line=0.2);
// file: 3004.scad
use <../lib.scad>
use <s/3004s01.scad>
$fa=1; $fs=0.2;
function ldraw_lib__3004(realsolid=false) = [
// 0 Brick  1 x  2
// 0 Name: 3004.dat
// 0 Author: James Jessiman
// 0 !LDRAW_ORG Part UPDATE 2022-05
// 0 !LICENSE Licensed under CC BY 2.0 and CC BY 4.0 : see CAreadme.txt
// 
// 0 BFC CERTIFY CCW
  [0,"BFC","CERTIFY"],
  [0,"BFC","CCW"],
// 
// 0 !HISTORY 2001-10-26 [PTadmin] Official Update 2001-01
// 0 !HISTORY 2002-05-07 {unknown} BFC Certification
// 0 !HISTORY 2002-06-11 [PTadmin] Official Update 2002-03
// 0 !HISTORY 2007-05-07 [PTadmin] Header formatted for Contributor Agreement
// 0 !HISTORY 2008-07-01 [PTadmin] Official Update 2008-01
// 0 !HISTORY 2022-08-04 [MagFors] Using subfile
// 0 !HISTORY 2022-09-15 [PTadmin] Official Update 2022-05
// 
// 
// 1 16 0 0 0 1 0 0 0 1 0 0 0 1 s\3004s01.dat
  [1,16,0,0,0,1,0,0,0,1,0,0,0,1, ldraw_lib__s__3004s01(realsolid)],
// 4 16 -20 24 -10 20 24 -10 20 0 -10 -20 0 -10
  [4,16,-20,24,-10,20,24,-10,20,0,-10,-20,0,-10],
];
module ldraw_lib__3004(step=0, col=false, unit=2/5, alt=false, line=0.2, solid=!$preview)
    makepoly(ldraw_lib__3004(solid), step=step, col=col, unit=unit, alt=alt, line=line, solid=solid);
ldraw_lib__3004(line=0.2);
// file: u9053.scad
use <../lib.scad>
use <../p/4-4cyli.scad>
use <../p/4-4edge.scad>
use <../p/4-4ring1.scad>
$fa=1; $fs=0.2;
function ldraw_lib__u9053(realsolid=false) = [
// 0 ~Technic Flex-System Hose End
// 0 Name: u9053.dat
// 0 Author: William Howard [WilliamH]
// 0 !LDRAW_ORG Part UPDATE 2011-02
// 0 !LICENSE Licensed under CC BY 2.0 and CC BY 4.0 : see CAreadme.txt
// 
// 0 BFC CERTIFY CCW
  [0,"BFC","CERTIFY"],
  [0,"BFC","CCW"],
// 
// 0 !HISTORY 2011-12-21 [cwdee] Reworked subparting technique
// 0 !HISTORY 2011-12-23 [PTadmin] Renamed from 76
// 0 !HISTORY 2011-12-29 [PTadmin] Official Update 2011-02
// 
// 
// 1 16 0 0 0 2 0 0 0 1 0 0 0 2 4-4ring1.dat
  [1,16,0,0,0,2,0,0,0,1,0,0,0,2, ldraw_lib__4_4ring1(realsolid)],
// 1 16 0 0 0 2 0 0 0 1 0 0 0 2 4-4edge.dat
  [1,16,0,0,0,2,0,0,0,1,0,0,0,2, ldraw_lib__4_4edge(realsolid)],
// 0 BFC INVERTNEXT
  [0,"BFC","INVERTNEXT"],
// 1 16 0 0 0 2 0 0 0 1 0 0 0 2 4-4cyli.dat
  [1,16,0,0,0,2,0,0,0,1,0,0,0,2, ldraw_lib__4_4cyli(realsolid)],
// 1 16 0 0 0 4 0 0 0 1 0 0 0 4 4-4edge.dat
  [1,16,0,0,0,4,0,0,0,1,0,0,0,4, ldraw_lib__4_4edge(realsolid)],
// 1 16 0 0 0 4 0 0 0 1 0 0 0 4 4-4cyli.dat
  [1,16,0,0,0,4,0,0,0,1,0,0,0,4, ldraw_lib__4_4cyli(realsolid)],
// 0
];
module ldraw_lib__u9053(step=0, col=false, unit=2/5, alt=false, line=0.2, solid=!$preview)
    makepoly(ldraw_lib__u9053(solid), step=step, col=col, unit=unit, alt=alt, line=line, solid=solid);
ldraw_lib__u9053(line=0.2);
// file: 77.scad
use <../lib.scad>
use <../p/4-4cyli.scad>
$fa=1; $fs=0.2;
function ldraw_lib__77(realsolid=false) = [
// 0 ~Technic Flex-System Hose Segment
// 0 Name: 77.dat
// 0 Author: William Howard [WilliamH]
// 0 !LDRAW_ORG Part UPDATE 2011-02
// 0 !LICENSE Licensed under CC BY 2.0 and CC BY 4.0 : see CAreadme.txt
// 
// 0 BFC CERTIFY CCW
  [0,"BFC","CERTIFY"],
  [0,"BFC","CCW"],
// 
// 0 !HISTORY 2011-12-21 [cwdee] Reworked subparting technique
// 0 !HISTORY 2011-12-29 [PTadmin] Official Update 2011-02
// 
// 
// 1 16 0 0 0 4 0 0 0 1 0 0 0 4 4-4cyli.dat
  [1,16,0,0,0,4,0,0,0,1,0,0,0,4, ldraw_lib__4_4cyli(realsolid)],
// 0 BFC INVERTNEXT
  [0,"BFC","INVERTNEXT"],
// 1 16 0 0 0 2 0 0 0 1 0 0 0 2 4-4cyli.dat
  [1,16,0,0,0,2,0,0,0,1,0,0,0,2, ldraw_lib__4_4cyli(realsolid)],
// 0
];
module ldraw_lib__77(step=0, col=false, unit=2/5, alt=false, line=0.2, solid=!$preview)
    makepoly(ldraw_lib__77(solid), step=step, col=col, unit=unit, alt=alt, line=line, solid=solid);
ldraw_lib__77(line=0.2);
// main file
use <../lib.scad>
use <77.scad>
use <u9053.scad>
$fa=1; $fs=0.2;
function ldraw_lib__76289(realsolid=false) = [
// 0 Technic Flex-System Hose  7L (140LDU)
// 0 Name: 76289.dat
// 0 Author: Chris Dee [cwdee]
// 0 !LDRAW_ORG Part UPDATE 2011-02
// 0 !LICENSE Licensed under CC BY 2.0 and CC BY 4.0 : see CAreadme.txt
// 
// 0 BFC CERTIFY CCW
  [0,"BFC","CERTIFY"],
  [0,"BFC","CCW"],
// 
// 0 !KEYWORDS bar, tube
// 
// 0 !HISTORY 2011-12-29 [PTadmin] Official Update 2011-02
// 
// 
// 1 16 0 0 0 1 0 0 0 1 0 0 0 1 u9053.dat
  [1,16,0,0,0,1,0,0,0,1,0,0,0,1, ldraw_lib__u9053(realsolid)],
// 1 16 0 1 0 1 0 0 0 138 0 0 0 1 77.dat
  [1,16,0,1,0,1,0,0,0,138,0,0,0,1, ldraw_lib__77(realsolid)],
// 1 16 0 140 0 1 0 0 0 -1 0 0 0 1 u9053.dat
  [1,16,0,140,0,1,0,0,0,-1,0,0,0,1, ldraw_lib__u9053(realsolid)],
];
module ldraw_lib__76289(step=0, col=false, unit=2/5, alt=false, line=0.2, solid=!$preview)
    makepoly(ldraw_lib__76289(solid), step=step, col=col, unit=unit, alt=alt, line=line, solid=solid);
ldraw_lib__76289(line=0.2);
